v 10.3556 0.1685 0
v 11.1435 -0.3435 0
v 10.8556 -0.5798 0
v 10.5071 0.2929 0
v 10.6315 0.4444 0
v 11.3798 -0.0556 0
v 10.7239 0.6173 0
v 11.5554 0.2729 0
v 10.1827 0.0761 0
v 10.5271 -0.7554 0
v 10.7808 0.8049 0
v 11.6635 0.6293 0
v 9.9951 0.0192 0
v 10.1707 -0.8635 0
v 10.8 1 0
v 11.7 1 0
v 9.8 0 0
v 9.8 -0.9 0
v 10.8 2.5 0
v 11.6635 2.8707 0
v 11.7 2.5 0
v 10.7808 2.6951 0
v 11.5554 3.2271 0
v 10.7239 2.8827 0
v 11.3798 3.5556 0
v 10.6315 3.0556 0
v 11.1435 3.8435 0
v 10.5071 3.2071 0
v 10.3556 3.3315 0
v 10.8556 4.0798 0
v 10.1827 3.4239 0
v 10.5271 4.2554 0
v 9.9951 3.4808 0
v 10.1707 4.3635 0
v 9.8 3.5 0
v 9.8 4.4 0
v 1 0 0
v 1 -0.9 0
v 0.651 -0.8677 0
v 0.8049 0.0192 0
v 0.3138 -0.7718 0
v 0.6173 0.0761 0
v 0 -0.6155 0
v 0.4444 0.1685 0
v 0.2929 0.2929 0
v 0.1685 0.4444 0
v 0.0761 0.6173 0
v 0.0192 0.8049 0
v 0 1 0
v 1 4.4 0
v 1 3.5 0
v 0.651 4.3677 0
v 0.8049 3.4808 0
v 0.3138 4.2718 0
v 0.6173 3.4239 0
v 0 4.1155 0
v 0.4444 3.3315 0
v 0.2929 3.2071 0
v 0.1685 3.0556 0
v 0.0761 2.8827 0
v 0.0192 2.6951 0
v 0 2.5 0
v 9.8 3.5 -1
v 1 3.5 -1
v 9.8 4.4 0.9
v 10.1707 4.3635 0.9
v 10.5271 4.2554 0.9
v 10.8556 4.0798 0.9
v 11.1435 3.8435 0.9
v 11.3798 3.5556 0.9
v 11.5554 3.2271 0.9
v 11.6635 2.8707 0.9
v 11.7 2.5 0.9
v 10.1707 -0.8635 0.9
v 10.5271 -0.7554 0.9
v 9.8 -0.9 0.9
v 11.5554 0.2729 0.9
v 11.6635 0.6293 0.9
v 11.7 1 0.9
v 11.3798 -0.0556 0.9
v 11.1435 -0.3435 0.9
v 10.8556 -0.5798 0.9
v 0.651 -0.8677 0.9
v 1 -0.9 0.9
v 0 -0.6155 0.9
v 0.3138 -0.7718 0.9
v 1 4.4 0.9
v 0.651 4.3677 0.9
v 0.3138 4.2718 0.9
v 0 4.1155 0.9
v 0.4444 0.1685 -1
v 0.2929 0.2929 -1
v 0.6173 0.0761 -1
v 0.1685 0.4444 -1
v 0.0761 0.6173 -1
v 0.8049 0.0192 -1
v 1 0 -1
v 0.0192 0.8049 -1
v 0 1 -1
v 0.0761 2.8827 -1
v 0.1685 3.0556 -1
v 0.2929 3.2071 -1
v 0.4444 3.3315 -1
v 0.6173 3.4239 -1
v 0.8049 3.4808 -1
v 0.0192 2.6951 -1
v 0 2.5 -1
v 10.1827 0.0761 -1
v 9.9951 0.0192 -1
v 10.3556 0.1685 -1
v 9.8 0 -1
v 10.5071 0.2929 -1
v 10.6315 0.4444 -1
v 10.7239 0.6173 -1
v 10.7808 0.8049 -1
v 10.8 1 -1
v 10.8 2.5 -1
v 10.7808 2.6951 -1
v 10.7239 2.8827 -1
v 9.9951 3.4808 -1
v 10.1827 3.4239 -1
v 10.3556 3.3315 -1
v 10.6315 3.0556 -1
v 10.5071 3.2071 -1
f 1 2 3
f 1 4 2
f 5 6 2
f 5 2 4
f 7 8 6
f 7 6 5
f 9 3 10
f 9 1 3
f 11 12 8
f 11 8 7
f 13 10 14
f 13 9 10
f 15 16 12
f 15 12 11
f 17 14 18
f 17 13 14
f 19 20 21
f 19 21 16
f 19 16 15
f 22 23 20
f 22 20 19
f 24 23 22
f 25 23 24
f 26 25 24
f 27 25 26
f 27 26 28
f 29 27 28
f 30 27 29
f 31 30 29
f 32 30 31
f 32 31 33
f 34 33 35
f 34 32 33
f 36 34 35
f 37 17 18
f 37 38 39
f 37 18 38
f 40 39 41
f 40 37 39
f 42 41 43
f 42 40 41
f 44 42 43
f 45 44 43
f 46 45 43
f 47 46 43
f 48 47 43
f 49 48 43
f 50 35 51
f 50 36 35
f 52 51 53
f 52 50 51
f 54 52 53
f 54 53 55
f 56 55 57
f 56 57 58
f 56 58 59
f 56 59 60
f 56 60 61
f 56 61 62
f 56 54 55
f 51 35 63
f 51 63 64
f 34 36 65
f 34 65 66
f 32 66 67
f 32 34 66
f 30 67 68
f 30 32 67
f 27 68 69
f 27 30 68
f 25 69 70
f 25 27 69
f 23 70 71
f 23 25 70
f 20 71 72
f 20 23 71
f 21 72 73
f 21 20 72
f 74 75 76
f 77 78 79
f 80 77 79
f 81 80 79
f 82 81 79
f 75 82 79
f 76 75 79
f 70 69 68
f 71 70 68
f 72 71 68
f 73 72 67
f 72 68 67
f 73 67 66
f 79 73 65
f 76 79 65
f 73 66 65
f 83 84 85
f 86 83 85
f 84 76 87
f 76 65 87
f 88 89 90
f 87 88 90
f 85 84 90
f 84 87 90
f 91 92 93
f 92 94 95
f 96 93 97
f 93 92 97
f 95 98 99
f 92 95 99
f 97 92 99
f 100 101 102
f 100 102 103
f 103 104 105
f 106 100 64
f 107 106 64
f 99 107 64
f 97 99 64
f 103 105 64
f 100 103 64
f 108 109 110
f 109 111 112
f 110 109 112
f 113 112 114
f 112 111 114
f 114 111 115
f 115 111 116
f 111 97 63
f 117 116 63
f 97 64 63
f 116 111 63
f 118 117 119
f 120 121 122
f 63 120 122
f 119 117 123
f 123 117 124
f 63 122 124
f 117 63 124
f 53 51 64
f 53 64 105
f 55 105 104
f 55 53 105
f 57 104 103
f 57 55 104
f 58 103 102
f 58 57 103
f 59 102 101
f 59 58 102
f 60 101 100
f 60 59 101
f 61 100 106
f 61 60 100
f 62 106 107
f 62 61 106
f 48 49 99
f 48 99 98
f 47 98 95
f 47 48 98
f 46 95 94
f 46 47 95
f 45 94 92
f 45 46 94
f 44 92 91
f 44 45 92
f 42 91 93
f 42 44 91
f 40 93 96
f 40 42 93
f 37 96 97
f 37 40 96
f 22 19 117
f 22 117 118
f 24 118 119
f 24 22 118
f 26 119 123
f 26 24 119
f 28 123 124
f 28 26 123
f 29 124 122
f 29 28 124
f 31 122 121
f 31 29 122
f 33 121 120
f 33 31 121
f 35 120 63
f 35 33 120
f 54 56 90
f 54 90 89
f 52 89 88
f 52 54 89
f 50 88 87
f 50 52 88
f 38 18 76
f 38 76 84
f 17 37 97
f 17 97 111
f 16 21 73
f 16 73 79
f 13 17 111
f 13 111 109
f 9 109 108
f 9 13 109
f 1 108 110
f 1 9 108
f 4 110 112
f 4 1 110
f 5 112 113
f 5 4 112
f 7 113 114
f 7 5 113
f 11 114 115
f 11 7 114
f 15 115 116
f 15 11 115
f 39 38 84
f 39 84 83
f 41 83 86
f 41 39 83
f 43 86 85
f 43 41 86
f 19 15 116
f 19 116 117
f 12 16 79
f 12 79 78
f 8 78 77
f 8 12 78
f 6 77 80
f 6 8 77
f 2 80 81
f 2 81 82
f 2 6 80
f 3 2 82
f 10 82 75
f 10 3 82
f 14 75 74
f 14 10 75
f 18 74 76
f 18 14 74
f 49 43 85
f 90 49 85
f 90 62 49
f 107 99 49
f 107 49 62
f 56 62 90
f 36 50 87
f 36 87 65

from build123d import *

# Parameters (mm, degrees)
LOCATING_TONGUE_DEPTH = 1
COVER_FLANGE_DEPTH    = 0.9


with BuildPart() as part:
    # Locating_tongue_profile → Locating_tongue (new body)
    with BuildSketch(Plane.XY):
        with BuildLine():
            Line((1, 0), (9.8, 0))
            ThreePointArc((9.8, 0), (10.507106781, 0.292893219), (10.8, 1))
            Line((10.8, 1), (10.8, 2.5))
            ThreePointArc((10.8, 2.5), (10.507106781, 3.207106781), (9.8, 3.5))
            Line((9.8, 3.5), (1, 3.5))
            ThreePointArc((1, 3.5), (0.292893219, 3.207106781), (0, 2.5))
            Line((0, 2.5), (0, 1))
            ThreePointArc((0, 1), (0.292893219, 0.292893219), (1, 0))
        make_face()
    extrude(amount=-LOCATING_TONGUE_DEPTH)

    # Cover_flange_profile → Cover_flange (add)
    with BuildSketch(Plane.XY):
        with BuildLine():
            Line((0, -0.615549442), (0, 4.115549442))
            ThreePointArc((0, 4.115549442), (0.480165382, 4.327504301), (1, 4.4))
            Line((1, 4.4), (9.8, 4.4))
            ThreePointArc((9.8, 4.4), (11.143502884, 3.843502884), (11.7, 2.5))
            Line((11.7, 2.5), (11.7, 1))
            ThreePointArc((11.7, 1), (11.143502884, -0.343502884), (9.8, -0.9))
            Line((9.8, -0.9), (1, -0.9))
            ThreePointArc((1, -0.9), (0.480165382, -0.827504301), (0, -0.615549442))
        make_face()
    extrude(amount=COVER_FLANGE_DEPTH)


solid = part.part
